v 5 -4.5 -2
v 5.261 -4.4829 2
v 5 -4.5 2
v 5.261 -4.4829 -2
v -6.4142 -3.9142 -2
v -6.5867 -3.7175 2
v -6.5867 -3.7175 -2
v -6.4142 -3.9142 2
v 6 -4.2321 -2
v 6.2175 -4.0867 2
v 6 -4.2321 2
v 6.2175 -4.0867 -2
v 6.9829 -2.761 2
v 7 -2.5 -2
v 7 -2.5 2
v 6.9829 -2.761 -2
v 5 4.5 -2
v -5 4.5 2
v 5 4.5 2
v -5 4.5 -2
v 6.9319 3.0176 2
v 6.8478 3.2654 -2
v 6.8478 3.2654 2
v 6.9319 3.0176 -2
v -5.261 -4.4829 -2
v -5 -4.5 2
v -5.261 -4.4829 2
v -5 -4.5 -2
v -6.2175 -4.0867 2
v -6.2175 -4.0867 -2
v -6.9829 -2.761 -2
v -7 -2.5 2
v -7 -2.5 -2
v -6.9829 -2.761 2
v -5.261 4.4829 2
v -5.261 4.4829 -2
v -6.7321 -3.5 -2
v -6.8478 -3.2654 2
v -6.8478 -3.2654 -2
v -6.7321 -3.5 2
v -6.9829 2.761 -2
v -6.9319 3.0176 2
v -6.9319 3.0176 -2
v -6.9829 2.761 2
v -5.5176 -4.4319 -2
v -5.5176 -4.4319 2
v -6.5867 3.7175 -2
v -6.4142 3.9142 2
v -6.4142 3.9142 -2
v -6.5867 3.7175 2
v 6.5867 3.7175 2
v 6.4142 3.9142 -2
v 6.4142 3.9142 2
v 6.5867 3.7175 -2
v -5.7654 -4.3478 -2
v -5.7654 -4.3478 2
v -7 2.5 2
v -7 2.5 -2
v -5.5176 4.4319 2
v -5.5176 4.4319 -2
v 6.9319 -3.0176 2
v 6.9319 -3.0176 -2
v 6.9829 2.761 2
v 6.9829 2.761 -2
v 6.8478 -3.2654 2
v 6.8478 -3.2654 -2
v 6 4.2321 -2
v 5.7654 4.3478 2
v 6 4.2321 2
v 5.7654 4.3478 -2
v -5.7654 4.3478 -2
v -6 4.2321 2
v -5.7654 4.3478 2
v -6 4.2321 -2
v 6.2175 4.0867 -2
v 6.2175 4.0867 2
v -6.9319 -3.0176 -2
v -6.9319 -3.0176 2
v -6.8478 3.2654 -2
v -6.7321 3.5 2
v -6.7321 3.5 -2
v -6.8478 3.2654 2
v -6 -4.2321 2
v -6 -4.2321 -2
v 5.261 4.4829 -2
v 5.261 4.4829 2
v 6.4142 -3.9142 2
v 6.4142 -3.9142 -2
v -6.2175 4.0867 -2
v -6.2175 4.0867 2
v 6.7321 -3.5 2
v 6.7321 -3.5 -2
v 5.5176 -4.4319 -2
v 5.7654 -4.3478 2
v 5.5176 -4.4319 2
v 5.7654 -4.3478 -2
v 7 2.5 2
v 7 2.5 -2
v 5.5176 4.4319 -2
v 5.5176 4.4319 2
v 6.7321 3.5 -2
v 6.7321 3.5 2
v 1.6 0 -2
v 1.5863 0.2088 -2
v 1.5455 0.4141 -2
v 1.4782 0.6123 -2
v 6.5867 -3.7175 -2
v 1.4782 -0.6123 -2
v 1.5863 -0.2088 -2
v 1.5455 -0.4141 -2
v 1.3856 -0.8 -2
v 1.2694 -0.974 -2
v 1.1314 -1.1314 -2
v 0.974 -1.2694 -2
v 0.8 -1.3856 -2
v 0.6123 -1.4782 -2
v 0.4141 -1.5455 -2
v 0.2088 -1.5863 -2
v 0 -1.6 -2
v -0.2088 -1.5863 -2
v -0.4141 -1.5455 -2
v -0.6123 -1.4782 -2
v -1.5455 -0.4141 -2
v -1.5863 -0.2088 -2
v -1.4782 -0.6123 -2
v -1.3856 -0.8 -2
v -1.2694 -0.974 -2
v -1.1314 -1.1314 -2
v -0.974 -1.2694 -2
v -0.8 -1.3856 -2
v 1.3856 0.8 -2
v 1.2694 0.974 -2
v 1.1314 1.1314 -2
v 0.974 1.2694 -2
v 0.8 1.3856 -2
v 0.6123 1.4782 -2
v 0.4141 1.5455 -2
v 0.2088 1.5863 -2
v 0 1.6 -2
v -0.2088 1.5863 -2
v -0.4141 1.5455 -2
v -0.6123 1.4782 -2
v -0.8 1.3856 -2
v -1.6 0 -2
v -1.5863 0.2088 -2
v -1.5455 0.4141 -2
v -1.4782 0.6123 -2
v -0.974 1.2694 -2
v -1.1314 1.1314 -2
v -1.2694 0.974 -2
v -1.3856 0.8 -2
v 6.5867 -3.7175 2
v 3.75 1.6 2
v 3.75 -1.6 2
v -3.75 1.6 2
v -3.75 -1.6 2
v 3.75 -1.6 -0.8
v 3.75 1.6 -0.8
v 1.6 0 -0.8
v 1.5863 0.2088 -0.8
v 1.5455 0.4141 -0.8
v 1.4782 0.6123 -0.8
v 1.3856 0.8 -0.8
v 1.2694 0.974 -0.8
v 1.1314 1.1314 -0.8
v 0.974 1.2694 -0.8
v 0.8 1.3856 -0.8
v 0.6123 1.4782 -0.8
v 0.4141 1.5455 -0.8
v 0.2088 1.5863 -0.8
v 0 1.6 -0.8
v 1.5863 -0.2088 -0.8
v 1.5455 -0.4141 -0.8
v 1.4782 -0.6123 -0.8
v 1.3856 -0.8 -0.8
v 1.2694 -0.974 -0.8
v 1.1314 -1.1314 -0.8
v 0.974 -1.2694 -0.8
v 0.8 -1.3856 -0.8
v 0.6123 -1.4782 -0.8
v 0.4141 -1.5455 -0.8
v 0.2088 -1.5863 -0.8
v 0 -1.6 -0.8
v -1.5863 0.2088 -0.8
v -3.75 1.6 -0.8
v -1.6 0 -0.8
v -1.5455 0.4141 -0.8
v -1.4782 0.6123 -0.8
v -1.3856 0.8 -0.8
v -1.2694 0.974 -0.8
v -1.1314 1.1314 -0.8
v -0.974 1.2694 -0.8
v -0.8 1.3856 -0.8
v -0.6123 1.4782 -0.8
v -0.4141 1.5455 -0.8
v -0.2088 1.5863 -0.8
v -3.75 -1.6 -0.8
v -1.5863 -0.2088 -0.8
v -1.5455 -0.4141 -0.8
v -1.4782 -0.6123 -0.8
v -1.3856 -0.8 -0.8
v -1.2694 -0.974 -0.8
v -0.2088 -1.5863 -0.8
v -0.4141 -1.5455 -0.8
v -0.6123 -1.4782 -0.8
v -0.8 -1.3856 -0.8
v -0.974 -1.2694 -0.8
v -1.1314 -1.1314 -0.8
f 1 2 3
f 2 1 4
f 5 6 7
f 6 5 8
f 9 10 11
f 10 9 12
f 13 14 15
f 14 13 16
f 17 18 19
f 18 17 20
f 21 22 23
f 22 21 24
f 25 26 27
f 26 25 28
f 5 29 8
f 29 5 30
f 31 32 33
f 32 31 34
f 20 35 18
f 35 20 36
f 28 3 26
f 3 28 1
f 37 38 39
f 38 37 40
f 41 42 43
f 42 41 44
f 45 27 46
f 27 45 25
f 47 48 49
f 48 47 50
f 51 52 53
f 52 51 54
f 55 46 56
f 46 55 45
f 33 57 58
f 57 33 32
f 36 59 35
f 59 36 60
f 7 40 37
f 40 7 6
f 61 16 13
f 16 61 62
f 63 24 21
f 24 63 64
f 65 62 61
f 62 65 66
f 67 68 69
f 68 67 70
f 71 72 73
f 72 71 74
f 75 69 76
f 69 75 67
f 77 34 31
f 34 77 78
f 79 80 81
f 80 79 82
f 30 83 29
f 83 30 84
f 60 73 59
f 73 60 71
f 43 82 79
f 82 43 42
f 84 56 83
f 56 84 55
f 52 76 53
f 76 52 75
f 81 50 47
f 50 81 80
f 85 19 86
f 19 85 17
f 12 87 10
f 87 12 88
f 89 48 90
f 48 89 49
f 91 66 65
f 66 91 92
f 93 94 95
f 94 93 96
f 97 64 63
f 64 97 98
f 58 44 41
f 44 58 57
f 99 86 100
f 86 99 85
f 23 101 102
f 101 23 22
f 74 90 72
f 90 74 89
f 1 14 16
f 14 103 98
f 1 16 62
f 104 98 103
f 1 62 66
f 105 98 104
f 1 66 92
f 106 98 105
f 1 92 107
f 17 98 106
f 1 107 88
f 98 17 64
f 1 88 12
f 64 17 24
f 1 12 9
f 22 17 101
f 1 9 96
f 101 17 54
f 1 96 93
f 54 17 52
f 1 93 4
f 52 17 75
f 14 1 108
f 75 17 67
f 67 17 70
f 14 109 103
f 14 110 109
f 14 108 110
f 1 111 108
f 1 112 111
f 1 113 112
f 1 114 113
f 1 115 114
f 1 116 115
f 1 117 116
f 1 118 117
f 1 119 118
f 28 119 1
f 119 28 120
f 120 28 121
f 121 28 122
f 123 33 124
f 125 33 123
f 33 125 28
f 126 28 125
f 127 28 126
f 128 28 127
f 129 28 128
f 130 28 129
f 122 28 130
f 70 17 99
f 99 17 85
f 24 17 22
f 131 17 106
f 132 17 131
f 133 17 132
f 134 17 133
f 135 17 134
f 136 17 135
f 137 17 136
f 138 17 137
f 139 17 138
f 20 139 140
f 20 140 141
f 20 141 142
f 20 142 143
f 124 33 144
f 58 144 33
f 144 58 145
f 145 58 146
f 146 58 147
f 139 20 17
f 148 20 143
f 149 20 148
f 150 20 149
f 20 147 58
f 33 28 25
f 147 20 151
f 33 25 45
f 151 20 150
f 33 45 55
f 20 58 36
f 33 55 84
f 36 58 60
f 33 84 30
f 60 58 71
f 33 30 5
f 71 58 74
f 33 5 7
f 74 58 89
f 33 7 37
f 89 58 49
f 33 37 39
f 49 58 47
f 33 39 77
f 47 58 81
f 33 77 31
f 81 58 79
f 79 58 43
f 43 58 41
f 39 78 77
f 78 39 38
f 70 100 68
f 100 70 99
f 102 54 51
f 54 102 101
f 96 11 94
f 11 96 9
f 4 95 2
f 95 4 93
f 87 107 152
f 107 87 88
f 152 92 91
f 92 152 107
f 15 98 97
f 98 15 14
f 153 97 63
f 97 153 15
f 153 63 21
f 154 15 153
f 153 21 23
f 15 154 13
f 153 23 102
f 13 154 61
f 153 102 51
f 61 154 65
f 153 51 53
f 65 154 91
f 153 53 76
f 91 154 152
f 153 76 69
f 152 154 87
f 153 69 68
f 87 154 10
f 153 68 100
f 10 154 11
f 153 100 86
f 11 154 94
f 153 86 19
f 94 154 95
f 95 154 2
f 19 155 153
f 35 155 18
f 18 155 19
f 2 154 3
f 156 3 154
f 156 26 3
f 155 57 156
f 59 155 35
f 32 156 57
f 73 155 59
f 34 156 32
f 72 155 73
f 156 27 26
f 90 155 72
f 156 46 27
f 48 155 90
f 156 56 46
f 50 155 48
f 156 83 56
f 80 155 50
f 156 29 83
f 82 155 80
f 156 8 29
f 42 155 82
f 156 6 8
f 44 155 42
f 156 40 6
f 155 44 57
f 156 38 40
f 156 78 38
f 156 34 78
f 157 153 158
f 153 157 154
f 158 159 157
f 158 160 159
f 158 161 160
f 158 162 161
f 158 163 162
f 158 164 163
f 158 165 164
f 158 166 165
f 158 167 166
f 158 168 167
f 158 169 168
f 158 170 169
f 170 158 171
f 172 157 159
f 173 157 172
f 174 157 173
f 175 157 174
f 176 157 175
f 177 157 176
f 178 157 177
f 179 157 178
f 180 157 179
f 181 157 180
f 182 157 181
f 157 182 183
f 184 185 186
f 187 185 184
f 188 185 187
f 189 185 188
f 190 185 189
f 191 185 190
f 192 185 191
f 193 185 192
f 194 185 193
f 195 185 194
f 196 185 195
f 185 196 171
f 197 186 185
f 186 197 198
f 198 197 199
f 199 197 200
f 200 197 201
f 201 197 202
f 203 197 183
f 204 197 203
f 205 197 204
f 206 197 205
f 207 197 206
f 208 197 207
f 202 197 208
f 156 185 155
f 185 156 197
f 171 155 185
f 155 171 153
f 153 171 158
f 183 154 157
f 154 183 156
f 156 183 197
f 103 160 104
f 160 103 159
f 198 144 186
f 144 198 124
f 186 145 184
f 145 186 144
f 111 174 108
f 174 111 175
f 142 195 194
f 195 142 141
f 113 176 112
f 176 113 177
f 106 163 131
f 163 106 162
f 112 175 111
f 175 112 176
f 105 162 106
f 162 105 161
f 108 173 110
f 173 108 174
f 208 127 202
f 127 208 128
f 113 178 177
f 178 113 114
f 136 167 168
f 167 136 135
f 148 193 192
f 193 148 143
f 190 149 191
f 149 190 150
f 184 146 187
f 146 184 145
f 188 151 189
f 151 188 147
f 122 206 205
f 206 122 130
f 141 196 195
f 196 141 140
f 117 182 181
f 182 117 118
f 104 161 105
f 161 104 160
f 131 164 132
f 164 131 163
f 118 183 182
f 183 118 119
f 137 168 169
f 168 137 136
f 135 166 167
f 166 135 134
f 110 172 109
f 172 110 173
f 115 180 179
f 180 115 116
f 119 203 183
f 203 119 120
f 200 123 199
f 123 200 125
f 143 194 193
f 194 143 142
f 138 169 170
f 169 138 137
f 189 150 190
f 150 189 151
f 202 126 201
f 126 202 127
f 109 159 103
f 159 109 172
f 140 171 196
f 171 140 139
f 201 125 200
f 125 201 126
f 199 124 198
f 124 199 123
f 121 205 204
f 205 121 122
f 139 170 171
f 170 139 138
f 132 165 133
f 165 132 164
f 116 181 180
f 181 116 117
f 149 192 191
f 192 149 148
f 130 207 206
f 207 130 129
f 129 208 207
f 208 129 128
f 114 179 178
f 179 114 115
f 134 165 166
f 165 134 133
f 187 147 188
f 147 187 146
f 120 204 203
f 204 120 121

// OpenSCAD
// file: rm_common.scad
// RobotMind Modular Ecosystem — common library
// Rev A concept for FDM prototyping, designed to migrate to injection molding.
$fn = 48;

// ---- Global mechanical interface ----
RM_DOCK_W = 30;
RM_DOCK_L = 34;
RM_DOCK_H = 5;
RM_RAIL_H = 2.6;
RM_RAIL_W = 3.2;
RM_RAIL_INSET = 3.8;
RM_CLEARANCE = 0.28;   // FDM sliding clearance per side
RM_LATCH_W = 7;
RM_LATCH_L = 9;
RM_LATCH_T = 1.6;
RM_LATCH_HOOK = 1.1;
RM_M3 = 3.3;

module rounded_box(size=[20,20,3], r=2, center=false) {
    x=size[0]; y=size[1]; z=size[2];
    translate(center ? [-x/2,-y/2,-z/2] : [0,0,0])
    linear_extrude(height=z)
      offset(r=r)
      offset(delta=-r)
      square([x,y]);
}

module slot2d(len=10, d=3) {
    hull(){
      translate([-len/2+d/2,0]) circle(d=d);
      translate([ len/2-d/2,0]) circle(d=d);
    }
}

// Male dovetail rail. The simplified trapezoid is robust in FDM and moldable.
module dovetail_rail(len=RM_DOCK_L-4, w=RM_RAIL_W, h=RM_RAIL_H) {
    linear_extrude(height=len)
      polygon(points=[[-w/2,0],[w/2,0],[w/2+1.0,h],[-w/2-1.0,h]]);
}

// Female channel cutter, slightly oversized.
module dovetail_channel(len=RM_DOCK_L, w=RM_RAIL_W+2*RM_CLEARANCE, h=RM_RAIL_H+RM_CLEARANCE) {
    linear_extrude(height=len)
      polygon(points=[[-w/2,0],[w/2,0],[w/2+1.15,h],[-w/2-1.15,h]]);
}

module male_interface() {
    // Interface origin centered X/Y, bottom at Z=0.
    for (sx=[-1,1])
      translate([sx*(RM_DOCK_W/2-RM_RAIL_INSET), -RM_DOCK_L/2+2, 0])
        rotate([-90,0,0]) dovetail_rail();
    // central catch boss engaged by dock latch
    translate([-RM_LATCH_W/2, RM_DOCK_L/2-7, 0])
      cube([RM_LATCH_W,4,1.25]);
}

module dock_body_base() {
    difference(){
      rounded_box([RM_DOCK_W,RM_DOCK_L,RM_DOCK_H],2.2,center=true);
      // open female dovetails from insertion side
      for (sx=[-1,1])
        translate([sx*(RM_DOCK_W/2-RM_RAIL_INSET), -RM_DOCK_L/2-0.2, -RM_DOCK_H/2+1.1])
          rotate([-90,0,0]) dovetail_channel(len=RM_DOCK_L+1);
      // four M3 mounting holes
      for(x=[-10.5,10.5], y=[-12,12]) translate([x,y,0]) cylinder(h=RM_DOCK_H+2,d=RM_M3,center=true);
      // latch relief window
      translate([-RM_LATCH_W/2-0.5, RM_DOCK_L/2-11, -RM_DOCK_H/2-0.1]) cube([RM_LATCH_W+1,11,RM_DOCK_H+1]);
    }
}

module latch_finger() {
    // flexible cantilever integrated at back of dock
    translate([-RM_LATCH_W/2, RM_DOCK_L/2-10, -RM_DOCK_H/2+0.7]) {
      cube([RM_LATCH_W,RM_LATCH_L,RM_LATCH_T]);
      translate([0,RM_LATCH_L-1.4,RM_LATCH_T]) cube([RM_LATCH_W,1.4,RM_LATCH_HOOK]);
      // thumb tab
      translate([-1.2,RM_LATCH_L-0.8,-0.2]) cube([RM_LATCH_W+2.4,3,RM_LATCH_T+0.4]);
    }
}

module universal_dock() {
    union(){ dock_body_base(); latch_finger(); }
}

module sensor_carrier(pcb=[20,20], wall=1.7, floor=1.8, clearance=0.5) {
    // carrier top tray centered; universal male interface below
    W=pcb[0]+2*(wall+clearance);
    L=pcb[1]+2*(wall+clearance);
    union(){
      translate([-W/2,-L/2,0]) difference(){
        rounded_box([W,L,floor+3.1],2);
        translate([wall,wall,floor]) rounded_box([pcb[0]+2*clearance,pcb[1]+2*clearance,5],1.0);
        // cable exit on front edge
        translate([W/2-6,-0.2,floor+0.5]) cube([12,wall+1,3.5]);
      }
      // small retention lips; gentle, printable snap
      for(x=[-W/2+2.2,W/2-2.2], y=[-L/2+2.2,L/2-2.2])
         translate([x,y,floor+2.5]) cylinder(h=1.3,d=2.2);
      translate([0,0,-RM_RAIL_H]) male_interface();
    }
}

module tag_insert(tag=[60,60], border=3.0, t=1.0, pulltab=true) {
    W=tag[0]+2*border; H=tag[1]+2*border;
    union(){
      translate([-W/2,-H/2,0]) rounded_box([W,H,t],1.2);
      if(pulltab) translate([-8,-H/2-4,0]) rounded_box([16,5,t],1.2);
    }
}

module tag_insert_rails(tag=[60,60], border=4, rail=1.5, depth=2.2) {
    W=tag[0]+2*border; H=tag[1]+2*border;
    // rails intended to capture tag insert edges
    for(sx=[-1,1]) translate([sx*(W/2-rail/2),0,0]) cube([rail,H,depth],center=true);
    translate([0,H/2-rail/2,0]) cube([W,rail,depth],center=true); // hard stop
}

module angle_wedge(angle=15, footprint=[RM_DOCK_W+4,RM_DOCK_L+4], min_h=3) {
    // solid wedge with top angled; child dock can be placed on top by caller
    W=footprint[0]; L=footprint[1]; dh=tan(angle)*L;
    polyhedron(points=[
      [-W/2,-L/2,0],[W/2,-L/2,0],[W/2,L/2,0],[-W/2,L/2,0],
      [-W/2,-L/2,min_h],[W/2,-L/2,min_h],[W/2,L/2,min_h+dh],[-W/2,L/2,min_h+dh]
    ], faces=[[0,1,2,3],[4,7,6,5],[0,4,5,1],[1,5,6,2],[2,6,7,3],[3,7,4,0]]);
}
// main file
include <rm_common.scad>
// Snap-in cable clip for 4-wire Grove cable, mounts to 3 mm slot/hole.
CABLE_W=7.5; CABLE_H=2.2;
difference(){
  rounded_box([14,9,4],2,center=true);
  translate([0,0,1.2]) cube([CABLE_W,CABLE_H+1,4],center=true);
  translate([0,0,-1]) cylinder(h=6,d=3.2,center=true);
}
